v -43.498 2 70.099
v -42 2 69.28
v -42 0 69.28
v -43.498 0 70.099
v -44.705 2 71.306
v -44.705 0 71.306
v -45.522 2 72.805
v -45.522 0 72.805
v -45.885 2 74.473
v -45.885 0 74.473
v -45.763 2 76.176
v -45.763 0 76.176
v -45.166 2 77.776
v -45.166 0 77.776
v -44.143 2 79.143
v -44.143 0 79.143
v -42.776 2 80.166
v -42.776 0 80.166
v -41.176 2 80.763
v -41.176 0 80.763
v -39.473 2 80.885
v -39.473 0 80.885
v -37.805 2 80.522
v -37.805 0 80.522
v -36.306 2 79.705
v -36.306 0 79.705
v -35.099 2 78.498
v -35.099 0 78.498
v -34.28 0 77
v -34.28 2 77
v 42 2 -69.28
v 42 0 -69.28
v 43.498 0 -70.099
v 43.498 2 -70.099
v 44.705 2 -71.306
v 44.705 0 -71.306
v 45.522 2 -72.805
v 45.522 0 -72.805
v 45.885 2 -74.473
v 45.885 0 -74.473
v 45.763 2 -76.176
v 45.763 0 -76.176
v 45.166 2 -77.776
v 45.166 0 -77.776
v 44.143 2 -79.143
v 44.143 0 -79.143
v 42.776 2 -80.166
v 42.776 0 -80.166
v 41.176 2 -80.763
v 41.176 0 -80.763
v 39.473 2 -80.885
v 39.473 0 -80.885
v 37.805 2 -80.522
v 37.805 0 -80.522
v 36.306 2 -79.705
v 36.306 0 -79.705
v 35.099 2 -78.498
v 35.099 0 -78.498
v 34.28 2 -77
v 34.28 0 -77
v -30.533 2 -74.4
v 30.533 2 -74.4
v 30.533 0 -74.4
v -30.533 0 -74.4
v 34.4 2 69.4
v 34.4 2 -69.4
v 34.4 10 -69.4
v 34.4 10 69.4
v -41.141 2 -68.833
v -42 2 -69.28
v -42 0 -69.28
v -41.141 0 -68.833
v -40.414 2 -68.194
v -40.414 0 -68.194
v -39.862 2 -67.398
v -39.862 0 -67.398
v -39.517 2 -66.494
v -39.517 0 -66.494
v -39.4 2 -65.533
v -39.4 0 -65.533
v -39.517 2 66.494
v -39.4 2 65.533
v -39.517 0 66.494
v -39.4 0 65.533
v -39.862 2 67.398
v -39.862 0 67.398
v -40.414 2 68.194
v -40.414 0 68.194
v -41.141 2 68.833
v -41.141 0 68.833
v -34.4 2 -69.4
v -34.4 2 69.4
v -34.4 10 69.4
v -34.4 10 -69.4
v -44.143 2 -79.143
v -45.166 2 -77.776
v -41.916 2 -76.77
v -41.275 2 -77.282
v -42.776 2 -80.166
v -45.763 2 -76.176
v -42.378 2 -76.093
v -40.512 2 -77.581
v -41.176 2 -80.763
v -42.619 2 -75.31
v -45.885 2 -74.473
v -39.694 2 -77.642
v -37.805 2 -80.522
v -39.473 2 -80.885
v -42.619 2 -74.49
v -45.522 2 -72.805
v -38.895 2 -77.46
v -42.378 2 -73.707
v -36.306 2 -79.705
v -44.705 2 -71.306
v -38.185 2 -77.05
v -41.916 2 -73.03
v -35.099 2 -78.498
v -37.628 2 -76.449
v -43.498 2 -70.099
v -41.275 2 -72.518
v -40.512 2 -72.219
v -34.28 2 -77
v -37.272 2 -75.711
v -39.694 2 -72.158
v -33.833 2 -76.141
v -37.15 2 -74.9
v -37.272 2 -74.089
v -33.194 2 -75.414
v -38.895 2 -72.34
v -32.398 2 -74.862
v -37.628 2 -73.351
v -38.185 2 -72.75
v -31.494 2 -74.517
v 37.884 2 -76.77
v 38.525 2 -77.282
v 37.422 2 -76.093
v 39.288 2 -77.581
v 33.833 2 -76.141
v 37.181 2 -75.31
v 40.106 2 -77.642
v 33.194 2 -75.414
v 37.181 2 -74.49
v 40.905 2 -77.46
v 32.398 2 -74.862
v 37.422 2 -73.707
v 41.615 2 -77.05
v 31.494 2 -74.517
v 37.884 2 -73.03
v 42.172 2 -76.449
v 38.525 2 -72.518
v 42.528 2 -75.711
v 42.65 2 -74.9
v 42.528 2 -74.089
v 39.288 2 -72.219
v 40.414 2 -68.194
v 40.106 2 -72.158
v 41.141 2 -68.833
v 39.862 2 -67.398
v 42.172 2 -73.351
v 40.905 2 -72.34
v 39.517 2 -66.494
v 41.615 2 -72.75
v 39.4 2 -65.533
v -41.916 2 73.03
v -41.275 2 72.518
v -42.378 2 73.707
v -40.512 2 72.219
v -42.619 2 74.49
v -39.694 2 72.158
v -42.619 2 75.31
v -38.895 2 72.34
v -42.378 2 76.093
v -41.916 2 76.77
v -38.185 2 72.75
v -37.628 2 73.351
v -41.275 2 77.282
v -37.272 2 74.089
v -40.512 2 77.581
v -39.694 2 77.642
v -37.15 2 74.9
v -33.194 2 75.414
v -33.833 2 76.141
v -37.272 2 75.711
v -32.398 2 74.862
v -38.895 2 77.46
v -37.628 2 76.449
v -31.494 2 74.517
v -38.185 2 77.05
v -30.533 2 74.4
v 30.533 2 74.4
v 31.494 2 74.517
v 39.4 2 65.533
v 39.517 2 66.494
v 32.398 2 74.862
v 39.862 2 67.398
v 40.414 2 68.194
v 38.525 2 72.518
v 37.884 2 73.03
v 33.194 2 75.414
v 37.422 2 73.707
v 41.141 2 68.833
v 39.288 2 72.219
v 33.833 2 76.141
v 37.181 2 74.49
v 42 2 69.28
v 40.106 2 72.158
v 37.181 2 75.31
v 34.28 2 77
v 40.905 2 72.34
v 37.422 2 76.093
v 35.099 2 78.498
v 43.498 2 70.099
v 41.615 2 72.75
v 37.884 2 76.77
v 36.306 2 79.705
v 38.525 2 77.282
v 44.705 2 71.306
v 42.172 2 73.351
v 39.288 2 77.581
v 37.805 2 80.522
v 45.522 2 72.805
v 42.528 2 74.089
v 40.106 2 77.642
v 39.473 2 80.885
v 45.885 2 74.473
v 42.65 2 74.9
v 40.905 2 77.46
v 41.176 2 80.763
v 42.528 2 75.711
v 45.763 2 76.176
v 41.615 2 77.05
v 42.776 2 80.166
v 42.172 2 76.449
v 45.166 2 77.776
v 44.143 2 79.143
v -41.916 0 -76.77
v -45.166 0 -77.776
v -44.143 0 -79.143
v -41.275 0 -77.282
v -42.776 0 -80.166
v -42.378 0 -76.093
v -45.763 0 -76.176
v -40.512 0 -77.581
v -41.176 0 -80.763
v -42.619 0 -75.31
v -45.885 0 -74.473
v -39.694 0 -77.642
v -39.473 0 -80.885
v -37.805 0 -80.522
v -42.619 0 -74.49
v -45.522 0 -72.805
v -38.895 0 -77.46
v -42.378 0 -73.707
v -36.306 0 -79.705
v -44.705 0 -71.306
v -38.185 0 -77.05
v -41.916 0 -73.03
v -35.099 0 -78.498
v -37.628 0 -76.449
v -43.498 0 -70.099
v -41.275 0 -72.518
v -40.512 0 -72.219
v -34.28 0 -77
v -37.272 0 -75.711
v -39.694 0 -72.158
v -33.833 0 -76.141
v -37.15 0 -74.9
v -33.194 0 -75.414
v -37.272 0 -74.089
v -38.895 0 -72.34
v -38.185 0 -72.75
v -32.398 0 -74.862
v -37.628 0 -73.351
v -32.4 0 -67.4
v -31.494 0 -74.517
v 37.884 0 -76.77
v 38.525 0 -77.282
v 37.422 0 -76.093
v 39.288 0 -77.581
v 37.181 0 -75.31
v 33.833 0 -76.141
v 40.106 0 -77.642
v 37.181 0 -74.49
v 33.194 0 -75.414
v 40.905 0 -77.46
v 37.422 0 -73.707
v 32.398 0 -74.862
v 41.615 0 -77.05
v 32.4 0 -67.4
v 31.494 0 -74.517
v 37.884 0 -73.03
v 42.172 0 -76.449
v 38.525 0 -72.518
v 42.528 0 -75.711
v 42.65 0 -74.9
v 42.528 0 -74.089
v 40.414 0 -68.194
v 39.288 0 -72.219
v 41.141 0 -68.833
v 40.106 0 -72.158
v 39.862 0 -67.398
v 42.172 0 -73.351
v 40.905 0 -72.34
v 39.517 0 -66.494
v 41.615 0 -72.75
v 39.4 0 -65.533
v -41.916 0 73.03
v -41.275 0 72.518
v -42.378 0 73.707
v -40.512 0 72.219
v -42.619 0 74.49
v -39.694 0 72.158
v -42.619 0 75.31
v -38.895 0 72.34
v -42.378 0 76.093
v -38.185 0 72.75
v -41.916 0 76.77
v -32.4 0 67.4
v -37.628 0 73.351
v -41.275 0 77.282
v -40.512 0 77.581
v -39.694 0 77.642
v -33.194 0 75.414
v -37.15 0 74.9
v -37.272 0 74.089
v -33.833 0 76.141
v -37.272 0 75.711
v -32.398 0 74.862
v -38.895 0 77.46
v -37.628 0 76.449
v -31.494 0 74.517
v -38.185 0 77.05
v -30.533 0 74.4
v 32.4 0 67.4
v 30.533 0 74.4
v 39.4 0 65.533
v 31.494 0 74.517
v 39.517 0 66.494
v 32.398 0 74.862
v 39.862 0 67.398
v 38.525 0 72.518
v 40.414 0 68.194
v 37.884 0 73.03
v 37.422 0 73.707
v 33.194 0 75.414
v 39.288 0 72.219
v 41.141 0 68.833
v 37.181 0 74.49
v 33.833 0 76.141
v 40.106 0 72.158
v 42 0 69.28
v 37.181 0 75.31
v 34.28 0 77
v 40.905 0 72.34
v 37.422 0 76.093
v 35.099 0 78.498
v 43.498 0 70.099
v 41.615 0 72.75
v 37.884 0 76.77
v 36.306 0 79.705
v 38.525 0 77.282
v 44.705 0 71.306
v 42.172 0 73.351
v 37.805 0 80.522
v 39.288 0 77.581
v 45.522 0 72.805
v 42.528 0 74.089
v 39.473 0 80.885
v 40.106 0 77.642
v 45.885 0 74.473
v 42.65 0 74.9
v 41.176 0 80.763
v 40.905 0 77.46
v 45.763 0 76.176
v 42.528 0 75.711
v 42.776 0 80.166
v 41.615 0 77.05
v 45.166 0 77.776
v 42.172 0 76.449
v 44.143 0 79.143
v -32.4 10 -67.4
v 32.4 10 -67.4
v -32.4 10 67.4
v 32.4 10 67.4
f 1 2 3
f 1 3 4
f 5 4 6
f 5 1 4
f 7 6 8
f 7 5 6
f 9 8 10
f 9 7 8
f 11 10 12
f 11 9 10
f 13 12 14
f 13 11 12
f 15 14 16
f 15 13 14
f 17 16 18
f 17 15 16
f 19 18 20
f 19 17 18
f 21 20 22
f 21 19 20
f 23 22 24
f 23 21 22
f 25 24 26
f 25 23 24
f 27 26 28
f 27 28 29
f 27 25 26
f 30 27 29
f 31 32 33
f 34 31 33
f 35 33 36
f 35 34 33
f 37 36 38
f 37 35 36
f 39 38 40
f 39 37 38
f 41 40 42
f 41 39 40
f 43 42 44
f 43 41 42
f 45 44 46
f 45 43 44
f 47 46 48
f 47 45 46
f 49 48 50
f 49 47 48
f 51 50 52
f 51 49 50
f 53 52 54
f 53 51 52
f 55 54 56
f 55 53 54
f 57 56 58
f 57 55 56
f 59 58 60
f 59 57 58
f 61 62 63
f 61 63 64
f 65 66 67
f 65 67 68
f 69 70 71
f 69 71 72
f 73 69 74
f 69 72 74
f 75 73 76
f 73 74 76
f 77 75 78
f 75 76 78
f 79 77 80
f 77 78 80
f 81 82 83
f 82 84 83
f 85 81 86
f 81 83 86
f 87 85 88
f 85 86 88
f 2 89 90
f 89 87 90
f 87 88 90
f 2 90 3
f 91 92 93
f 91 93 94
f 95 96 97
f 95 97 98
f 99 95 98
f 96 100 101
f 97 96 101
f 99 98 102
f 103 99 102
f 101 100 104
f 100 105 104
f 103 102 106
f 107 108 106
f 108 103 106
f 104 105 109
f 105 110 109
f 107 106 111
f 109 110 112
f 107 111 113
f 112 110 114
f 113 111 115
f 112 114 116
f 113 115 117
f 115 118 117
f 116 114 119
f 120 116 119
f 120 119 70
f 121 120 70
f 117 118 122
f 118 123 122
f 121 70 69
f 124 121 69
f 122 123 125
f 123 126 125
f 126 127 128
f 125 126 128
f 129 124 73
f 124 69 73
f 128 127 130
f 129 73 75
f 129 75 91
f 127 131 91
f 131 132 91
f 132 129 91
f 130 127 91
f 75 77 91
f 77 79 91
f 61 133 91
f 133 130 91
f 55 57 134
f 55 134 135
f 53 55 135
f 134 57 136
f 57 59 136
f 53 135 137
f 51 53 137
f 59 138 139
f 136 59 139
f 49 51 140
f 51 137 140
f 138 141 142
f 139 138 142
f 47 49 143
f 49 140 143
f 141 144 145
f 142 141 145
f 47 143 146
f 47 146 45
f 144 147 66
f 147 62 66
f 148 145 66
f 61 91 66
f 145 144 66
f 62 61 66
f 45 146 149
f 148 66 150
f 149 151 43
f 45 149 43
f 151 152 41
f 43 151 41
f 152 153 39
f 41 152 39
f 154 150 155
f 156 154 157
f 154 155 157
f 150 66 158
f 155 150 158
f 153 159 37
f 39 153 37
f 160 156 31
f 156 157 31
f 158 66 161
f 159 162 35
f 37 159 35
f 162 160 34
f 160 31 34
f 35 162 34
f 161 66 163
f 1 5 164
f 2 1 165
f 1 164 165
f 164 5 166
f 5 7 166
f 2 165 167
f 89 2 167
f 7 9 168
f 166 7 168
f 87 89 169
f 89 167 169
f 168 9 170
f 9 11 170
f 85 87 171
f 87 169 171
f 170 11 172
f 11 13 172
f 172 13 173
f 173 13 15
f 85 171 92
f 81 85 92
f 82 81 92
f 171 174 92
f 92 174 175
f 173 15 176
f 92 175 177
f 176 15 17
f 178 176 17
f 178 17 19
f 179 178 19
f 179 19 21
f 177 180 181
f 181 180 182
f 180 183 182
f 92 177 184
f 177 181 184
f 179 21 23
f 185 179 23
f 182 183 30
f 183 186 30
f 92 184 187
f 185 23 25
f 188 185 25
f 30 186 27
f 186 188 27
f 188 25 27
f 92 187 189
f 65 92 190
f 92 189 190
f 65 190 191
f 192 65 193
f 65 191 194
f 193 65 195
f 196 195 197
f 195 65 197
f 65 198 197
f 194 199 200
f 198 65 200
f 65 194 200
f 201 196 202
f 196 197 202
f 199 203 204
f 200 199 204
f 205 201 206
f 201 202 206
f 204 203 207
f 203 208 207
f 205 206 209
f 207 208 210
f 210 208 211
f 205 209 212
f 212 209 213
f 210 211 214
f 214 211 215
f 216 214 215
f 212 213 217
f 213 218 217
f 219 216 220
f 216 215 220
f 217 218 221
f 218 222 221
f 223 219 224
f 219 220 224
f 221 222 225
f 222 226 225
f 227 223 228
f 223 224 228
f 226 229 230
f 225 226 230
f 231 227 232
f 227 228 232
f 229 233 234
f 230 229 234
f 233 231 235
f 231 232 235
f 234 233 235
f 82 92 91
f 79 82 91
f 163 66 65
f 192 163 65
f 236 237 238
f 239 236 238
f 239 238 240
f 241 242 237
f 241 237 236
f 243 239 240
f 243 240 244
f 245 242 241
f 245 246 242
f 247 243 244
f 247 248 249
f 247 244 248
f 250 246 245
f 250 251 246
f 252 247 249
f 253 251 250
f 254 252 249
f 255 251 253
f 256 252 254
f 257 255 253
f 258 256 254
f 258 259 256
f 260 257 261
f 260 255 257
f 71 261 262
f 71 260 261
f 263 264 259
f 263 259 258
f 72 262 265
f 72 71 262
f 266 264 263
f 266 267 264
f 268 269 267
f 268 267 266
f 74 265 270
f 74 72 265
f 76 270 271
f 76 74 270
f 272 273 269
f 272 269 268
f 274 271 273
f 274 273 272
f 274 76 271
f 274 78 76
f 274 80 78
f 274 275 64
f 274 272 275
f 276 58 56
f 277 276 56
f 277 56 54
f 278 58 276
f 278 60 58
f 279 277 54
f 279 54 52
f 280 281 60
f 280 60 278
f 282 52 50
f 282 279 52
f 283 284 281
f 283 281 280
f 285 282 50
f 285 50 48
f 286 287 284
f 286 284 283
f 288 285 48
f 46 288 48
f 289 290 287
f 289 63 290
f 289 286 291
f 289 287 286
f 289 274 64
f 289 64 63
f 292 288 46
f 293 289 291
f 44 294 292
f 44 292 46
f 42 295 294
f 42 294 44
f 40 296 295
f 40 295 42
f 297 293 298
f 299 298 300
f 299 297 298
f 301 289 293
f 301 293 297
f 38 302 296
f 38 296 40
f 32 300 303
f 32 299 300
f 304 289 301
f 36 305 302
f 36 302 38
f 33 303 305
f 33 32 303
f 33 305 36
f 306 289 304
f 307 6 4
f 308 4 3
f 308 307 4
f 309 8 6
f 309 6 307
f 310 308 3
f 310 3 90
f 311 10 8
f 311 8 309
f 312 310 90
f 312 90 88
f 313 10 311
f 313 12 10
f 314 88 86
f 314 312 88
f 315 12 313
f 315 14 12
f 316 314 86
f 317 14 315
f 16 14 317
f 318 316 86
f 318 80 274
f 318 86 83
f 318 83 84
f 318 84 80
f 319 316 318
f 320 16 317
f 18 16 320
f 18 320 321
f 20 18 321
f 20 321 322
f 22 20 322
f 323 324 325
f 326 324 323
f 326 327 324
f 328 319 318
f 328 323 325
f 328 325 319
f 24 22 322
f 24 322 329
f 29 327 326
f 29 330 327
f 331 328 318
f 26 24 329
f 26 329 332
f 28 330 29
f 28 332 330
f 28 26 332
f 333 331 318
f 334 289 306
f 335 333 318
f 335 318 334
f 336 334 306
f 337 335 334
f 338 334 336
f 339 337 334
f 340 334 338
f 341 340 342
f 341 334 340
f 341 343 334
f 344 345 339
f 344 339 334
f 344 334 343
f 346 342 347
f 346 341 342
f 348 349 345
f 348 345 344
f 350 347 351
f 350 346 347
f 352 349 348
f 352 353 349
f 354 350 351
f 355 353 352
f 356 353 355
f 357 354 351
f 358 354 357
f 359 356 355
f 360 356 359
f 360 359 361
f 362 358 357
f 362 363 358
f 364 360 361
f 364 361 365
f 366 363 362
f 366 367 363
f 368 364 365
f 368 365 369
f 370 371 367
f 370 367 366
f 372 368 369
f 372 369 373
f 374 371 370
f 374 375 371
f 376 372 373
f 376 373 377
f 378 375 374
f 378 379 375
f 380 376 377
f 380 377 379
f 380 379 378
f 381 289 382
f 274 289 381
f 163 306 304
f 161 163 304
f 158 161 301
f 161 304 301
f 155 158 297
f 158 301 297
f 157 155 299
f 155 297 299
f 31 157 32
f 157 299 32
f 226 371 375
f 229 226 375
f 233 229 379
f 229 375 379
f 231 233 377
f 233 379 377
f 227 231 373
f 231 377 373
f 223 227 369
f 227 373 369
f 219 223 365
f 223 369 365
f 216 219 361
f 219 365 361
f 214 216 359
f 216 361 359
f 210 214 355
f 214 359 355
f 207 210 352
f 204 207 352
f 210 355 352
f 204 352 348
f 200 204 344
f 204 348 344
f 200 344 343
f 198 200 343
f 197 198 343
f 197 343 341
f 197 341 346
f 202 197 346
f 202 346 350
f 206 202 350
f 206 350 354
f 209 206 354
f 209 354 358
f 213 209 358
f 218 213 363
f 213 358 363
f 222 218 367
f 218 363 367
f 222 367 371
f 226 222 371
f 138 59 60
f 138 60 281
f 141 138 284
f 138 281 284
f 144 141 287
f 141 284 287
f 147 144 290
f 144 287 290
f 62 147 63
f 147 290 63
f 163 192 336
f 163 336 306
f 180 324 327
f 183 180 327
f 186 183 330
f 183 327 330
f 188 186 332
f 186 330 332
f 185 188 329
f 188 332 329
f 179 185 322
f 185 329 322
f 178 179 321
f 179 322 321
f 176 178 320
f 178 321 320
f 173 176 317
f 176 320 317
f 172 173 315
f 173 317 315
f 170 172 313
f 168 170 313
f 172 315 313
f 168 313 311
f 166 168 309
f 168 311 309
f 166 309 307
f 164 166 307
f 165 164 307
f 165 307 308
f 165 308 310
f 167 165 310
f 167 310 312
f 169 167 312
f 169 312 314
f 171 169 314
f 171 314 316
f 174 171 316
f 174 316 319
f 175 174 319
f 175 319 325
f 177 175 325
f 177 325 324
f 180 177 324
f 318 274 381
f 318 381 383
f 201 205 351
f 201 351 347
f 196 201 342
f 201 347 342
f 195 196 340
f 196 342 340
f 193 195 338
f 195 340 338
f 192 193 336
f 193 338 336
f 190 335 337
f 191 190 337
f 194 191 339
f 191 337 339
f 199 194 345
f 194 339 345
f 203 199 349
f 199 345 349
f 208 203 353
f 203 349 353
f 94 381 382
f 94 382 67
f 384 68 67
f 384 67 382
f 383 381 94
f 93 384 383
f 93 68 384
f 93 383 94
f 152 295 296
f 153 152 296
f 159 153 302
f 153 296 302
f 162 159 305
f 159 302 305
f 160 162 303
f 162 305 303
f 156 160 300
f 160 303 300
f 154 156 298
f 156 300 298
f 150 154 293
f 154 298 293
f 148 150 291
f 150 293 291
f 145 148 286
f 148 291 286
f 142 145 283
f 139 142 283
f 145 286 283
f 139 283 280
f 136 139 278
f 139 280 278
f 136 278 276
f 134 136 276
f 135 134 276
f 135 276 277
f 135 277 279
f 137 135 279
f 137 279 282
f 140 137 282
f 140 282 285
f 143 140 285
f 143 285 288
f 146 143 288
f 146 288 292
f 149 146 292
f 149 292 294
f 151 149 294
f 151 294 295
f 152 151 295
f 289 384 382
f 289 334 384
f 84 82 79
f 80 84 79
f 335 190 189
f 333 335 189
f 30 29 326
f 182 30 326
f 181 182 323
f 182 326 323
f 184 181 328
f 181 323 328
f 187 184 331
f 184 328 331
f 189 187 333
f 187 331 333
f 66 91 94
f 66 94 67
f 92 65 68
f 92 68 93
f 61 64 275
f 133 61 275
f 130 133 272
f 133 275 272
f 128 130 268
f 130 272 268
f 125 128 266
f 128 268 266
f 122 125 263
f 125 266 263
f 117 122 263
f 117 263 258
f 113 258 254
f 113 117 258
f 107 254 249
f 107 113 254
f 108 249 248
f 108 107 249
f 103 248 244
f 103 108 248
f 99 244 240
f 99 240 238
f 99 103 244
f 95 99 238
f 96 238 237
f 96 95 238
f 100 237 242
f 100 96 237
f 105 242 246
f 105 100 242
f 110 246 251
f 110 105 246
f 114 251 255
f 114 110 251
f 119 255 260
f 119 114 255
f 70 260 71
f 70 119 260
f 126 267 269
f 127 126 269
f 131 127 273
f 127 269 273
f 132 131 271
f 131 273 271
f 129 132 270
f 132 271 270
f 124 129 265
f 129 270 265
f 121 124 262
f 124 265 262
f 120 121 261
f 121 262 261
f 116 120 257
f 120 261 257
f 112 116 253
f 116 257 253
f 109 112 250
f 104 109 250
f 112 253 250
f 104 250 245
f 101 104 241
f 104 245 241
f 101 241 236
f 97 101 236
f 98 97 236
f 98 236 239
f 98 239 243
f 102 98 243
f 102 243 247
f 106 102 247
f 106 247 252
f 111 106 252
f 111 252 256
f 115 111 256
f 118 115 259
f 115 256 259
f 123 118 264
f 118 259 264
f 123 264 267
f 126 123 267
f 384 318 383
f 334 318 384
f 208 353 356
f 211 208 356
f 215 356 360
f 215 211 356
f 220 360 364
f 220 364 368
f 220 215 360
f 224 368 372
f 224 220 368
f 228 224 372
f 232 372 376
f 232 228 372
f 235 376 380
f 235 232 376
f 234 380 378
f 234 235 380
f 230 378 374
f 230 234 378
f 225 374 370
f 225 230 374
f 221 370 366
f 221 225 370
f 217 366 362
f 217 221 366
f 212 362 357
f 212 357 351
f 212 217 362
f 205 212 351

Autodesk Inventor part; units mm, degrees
ref_plane "YZ Plane" through (0, 0, 0) normal (1, 0, 0) x (0, 1, 0)
ref_plane "XZ Plane" through (0, 0, 0) normal (0, 1, 0) x (-1, 0, 0)
ref_plane "XY Plane" through (0, 0, 0) normal (0, 0, 1) x (1, 0, 0)
sketch "Sketch1" plane through (0, 0, 0) normal (0, 1, 0) x (-1, 0, 0)
  line L0 (-34.4, 69.4) -> (34.4, 69.4)
  line L1 (34.4, 69.4) -> (34.4, -69.4)
  line L2 (34.4, -69.4) -> (-34.4, -69.4)
  line L3 (-34.4, -69.4) -> (-34.4, 69.4)
  line L4 (-34.4, 69.4) -> (34.4, -69.4) construction
  line L5 (34.4, 69.4) -> (-34.4, -69.4) construction
  line L6 (32.4, -67.4) -> (32.4, 67.4)
  line L7 (32.4, 67.4) -> (-32.4, 67.4)
  line L8 (-32.4, 67.4) -> (-32.4, -67.4)
  line L9 (-32.4, -67.4) -> (32.4, -67.4)
  point P0 (0, 0)
  dimension "d0" = 68.8
  dimension "d1" = 138.8
  dimension "d2" = 2
extrude "Extrusion1" add sketch "Sketch1" along normal blind 10
sketch "Sketch2" plane through (0, 0, 0) normal (0, -1, 0) x (1, 0, 0)
  line L0 (-49.4, 84.4) -> (49.4, 84.4)
  line L1 (49.4, 84.4) -> (49.4, -84.4)
  line L2 (49.4, -84.4) -> (-49.4, -84.4)
  line L3 (-49.4, -84.4) -> (-49.4, 84.4)
  line L4 (-49.4, 84.4) -> (49.4, -84.4) construction
  line L5 (49.4, 84.4) -> (-49.4, -84.4) construction
  line L6 (34.4, 69.4) -> (34.4, -69.4) projected
  line L7 (-34.4, 69.4) -> (34.4, 69.4) projected
  line L8 (34.4, -69.4) -> (-34.4, -69.4) projected
  line L9 (-34.4, -69.4) -> (-34.4, 69.4) projected
  point P0 (0, 0)
  dimension "d5" = 15
  dimension "d6" = 15
extrude "Extrusion2" add sketch "Sketch2" against normal blind 2
fillet "Fillet1" radius 4 4 edges at (49.4, 1, -84.4) (49.4, 1, 84.4) (-49.4, 1, 84.4) (-49.4, 1, -84.4)
sketch "Sketch3" plane through (0, 0, 0) normal (0, -1, 0) x (1, 0, 0)
  arc A0 (-49.4, -80.4) -> (-45.4, -84.4) centre (-45.4, -80.4) ccw projected
  line L0 (-49.4, 80.4) -> (-49.4, -80.4) projected
  arc A1 (-45.4, 84.4) -> (-49.4, 80.4) centre (-45.4, 80.4) ccw projected
  line L1 (45.4, 84.4) -> (-45.4, 84.4) projected
  arc A2 (49.4, 80.4) -> (45.4, 84.4) centre (45.4, 80.4) ccw projected
  line L2 (49.4, -80.4) -> (49.4, 80.4) projected
  arc A3 (45.4, -84.4) -> (49.4, -80.4) centre (45.4, -80.4) ccw projected
  line L3 (-45.4, -84.4) -> (45.4, -84.4) projected
  line L4 (34.4, 69.4) -> (45.4, 80.4)
  circle A4 centre (39.9, 74.9) radius 2.75
  line L5 (34.4, -69.4) -> (-34.4, -69.4) projected
  line L6 (34.4, -69.4) -> (45.4, -80.4)
  circle A5 centre (39.9, -74.9) radius 2.75
  line L7 (45.4, -84.4) -> (-45.4, -84.4) projected
  line L8 (0, -84.4) -> (0, -77.4)
  circle A6 centre (-39.9, 74.9) radius 2.75
  circle A7 centre (-39.9, -74.9) radius 2.75
  point P0 (32.4, -67.4)
  point P1 (32.4, 67.4)
  point P2 (-32.4, 67.4)
  dimension "d20" = 5.5
  dimension "d21" = 5.5
extrude "Extrusion3" cut sketch "Sketch3" against normal up to surface (2 mm away) contours A4 L4 | L4 A4 | A5 L6 | L6 A5 | A6 | A7
sketch "Sketch4" plane through (0, 2, 0) normal (0, 1, 0) x (1, 0, 0)
  circle A0 centre (-39.9, -74.9) radius 2.75 projected
  circle A1 centre (-39.9, -74.9) radius 6
  circle A2 centre (39.9, -74.9) radius 2.75 projected
  circle A3 centre (39.9, -74.9) radius 6
  line L0 (33.9209, -74.4) -> (-33.9209, -74.4)
  line L1 (-34.4, -69.4) -> (34.4, -69.4) projected
  line L2 (0, 0) -> (-15.7082, 0)
  circle A4 centre (-39.9, 74.9) radius 2.75
  circle A5 centre (39.9, 74.9) radius 6
  line L3 (33.9209, 74.4) -> (-33.9209, 74.4)
  circle A6 centre (-39.9, 74.9) radius 6
  line L4 (-39.4, -68.9209) -> (-39.4, 68.9209)
  line L5 (-34.4, 69.4) -> (-34.4, -69.4) projected
  line L6 (39.4, -68.9209) -> (39.4, 68.9209)
  line L7 (34.4, -69.4) -> (34.4, 69.4) projected
  circle A7 centre (39.9, 74.9) radius 2.75 projected
  circle A8 centre (-39.9, -74.9) radius 2.75 projected
  circle A9 centre (39.9, -74.9) radius 2.75 projected
  circle A10 centre (-39.9, 74.9) radius 2.75 projected
  arc A11 (-45.4, 84.4) -> (-49.4, 80.4) centre (-45.4, 80.4) ccw projected
  line L8 (-49.4, 80.4) -> (-49.4, -80.4) projected
  arc A12 (-49.4, -80.4) -> (-45.4, -84.4) centre (-45.4, -80.4) ccw projected
  line L9 (-45.4, -84.4) -> (45.4, -84.4) projected
  arc A13 (45.4, -84.4) -> (49.4, -80.4) centre (45.4, -80.4) ccw projected
  line L10 (49.4, -80.4) -> (49.4, 80.4) projected
  arc A14 (49.4, 80.4) -> (45.4, 84.4) centre (45.4, 80.4) ccw projected
  line L11 (45.4, 84.4) -> (-45.4, 84.4) projected
  line L12 (34.4, -69.4) -> (34.4, 69.4) projected
  line L13 (-34.4, -69.4) -> (34.4, -69.4) projected
  line L14 (-34.4, 69.4) -> (-34.4, -69.4) projected
  line L15 (34.4, 69.4) -> (-34.4, 69.4) projected
  dimension "d22" = 12
  dimension "d23" = 12
  dimension "d24" = 5
  dimension "d25" = 5
  dimension "d26" = 5
extrude "Extrusion4" cut sketch "Sketch4" against normal blind 10 contours L11 A14 L10 A13 L9 A12 L8 A11
fillet "Fillet2" radius 4 8 edges at (-39.4, 1, 68.9209) (-33.9209, 1, 74.4) (-33.9209, 1, -74.4) (-39.4, 1, -68.9209) (33.9209, 1, -74.4) (39.4, 1, -68.9209) (39.4, 1, 68.9209) (33.9209, 1, 74.4)
properties part number "_3DPrint"
